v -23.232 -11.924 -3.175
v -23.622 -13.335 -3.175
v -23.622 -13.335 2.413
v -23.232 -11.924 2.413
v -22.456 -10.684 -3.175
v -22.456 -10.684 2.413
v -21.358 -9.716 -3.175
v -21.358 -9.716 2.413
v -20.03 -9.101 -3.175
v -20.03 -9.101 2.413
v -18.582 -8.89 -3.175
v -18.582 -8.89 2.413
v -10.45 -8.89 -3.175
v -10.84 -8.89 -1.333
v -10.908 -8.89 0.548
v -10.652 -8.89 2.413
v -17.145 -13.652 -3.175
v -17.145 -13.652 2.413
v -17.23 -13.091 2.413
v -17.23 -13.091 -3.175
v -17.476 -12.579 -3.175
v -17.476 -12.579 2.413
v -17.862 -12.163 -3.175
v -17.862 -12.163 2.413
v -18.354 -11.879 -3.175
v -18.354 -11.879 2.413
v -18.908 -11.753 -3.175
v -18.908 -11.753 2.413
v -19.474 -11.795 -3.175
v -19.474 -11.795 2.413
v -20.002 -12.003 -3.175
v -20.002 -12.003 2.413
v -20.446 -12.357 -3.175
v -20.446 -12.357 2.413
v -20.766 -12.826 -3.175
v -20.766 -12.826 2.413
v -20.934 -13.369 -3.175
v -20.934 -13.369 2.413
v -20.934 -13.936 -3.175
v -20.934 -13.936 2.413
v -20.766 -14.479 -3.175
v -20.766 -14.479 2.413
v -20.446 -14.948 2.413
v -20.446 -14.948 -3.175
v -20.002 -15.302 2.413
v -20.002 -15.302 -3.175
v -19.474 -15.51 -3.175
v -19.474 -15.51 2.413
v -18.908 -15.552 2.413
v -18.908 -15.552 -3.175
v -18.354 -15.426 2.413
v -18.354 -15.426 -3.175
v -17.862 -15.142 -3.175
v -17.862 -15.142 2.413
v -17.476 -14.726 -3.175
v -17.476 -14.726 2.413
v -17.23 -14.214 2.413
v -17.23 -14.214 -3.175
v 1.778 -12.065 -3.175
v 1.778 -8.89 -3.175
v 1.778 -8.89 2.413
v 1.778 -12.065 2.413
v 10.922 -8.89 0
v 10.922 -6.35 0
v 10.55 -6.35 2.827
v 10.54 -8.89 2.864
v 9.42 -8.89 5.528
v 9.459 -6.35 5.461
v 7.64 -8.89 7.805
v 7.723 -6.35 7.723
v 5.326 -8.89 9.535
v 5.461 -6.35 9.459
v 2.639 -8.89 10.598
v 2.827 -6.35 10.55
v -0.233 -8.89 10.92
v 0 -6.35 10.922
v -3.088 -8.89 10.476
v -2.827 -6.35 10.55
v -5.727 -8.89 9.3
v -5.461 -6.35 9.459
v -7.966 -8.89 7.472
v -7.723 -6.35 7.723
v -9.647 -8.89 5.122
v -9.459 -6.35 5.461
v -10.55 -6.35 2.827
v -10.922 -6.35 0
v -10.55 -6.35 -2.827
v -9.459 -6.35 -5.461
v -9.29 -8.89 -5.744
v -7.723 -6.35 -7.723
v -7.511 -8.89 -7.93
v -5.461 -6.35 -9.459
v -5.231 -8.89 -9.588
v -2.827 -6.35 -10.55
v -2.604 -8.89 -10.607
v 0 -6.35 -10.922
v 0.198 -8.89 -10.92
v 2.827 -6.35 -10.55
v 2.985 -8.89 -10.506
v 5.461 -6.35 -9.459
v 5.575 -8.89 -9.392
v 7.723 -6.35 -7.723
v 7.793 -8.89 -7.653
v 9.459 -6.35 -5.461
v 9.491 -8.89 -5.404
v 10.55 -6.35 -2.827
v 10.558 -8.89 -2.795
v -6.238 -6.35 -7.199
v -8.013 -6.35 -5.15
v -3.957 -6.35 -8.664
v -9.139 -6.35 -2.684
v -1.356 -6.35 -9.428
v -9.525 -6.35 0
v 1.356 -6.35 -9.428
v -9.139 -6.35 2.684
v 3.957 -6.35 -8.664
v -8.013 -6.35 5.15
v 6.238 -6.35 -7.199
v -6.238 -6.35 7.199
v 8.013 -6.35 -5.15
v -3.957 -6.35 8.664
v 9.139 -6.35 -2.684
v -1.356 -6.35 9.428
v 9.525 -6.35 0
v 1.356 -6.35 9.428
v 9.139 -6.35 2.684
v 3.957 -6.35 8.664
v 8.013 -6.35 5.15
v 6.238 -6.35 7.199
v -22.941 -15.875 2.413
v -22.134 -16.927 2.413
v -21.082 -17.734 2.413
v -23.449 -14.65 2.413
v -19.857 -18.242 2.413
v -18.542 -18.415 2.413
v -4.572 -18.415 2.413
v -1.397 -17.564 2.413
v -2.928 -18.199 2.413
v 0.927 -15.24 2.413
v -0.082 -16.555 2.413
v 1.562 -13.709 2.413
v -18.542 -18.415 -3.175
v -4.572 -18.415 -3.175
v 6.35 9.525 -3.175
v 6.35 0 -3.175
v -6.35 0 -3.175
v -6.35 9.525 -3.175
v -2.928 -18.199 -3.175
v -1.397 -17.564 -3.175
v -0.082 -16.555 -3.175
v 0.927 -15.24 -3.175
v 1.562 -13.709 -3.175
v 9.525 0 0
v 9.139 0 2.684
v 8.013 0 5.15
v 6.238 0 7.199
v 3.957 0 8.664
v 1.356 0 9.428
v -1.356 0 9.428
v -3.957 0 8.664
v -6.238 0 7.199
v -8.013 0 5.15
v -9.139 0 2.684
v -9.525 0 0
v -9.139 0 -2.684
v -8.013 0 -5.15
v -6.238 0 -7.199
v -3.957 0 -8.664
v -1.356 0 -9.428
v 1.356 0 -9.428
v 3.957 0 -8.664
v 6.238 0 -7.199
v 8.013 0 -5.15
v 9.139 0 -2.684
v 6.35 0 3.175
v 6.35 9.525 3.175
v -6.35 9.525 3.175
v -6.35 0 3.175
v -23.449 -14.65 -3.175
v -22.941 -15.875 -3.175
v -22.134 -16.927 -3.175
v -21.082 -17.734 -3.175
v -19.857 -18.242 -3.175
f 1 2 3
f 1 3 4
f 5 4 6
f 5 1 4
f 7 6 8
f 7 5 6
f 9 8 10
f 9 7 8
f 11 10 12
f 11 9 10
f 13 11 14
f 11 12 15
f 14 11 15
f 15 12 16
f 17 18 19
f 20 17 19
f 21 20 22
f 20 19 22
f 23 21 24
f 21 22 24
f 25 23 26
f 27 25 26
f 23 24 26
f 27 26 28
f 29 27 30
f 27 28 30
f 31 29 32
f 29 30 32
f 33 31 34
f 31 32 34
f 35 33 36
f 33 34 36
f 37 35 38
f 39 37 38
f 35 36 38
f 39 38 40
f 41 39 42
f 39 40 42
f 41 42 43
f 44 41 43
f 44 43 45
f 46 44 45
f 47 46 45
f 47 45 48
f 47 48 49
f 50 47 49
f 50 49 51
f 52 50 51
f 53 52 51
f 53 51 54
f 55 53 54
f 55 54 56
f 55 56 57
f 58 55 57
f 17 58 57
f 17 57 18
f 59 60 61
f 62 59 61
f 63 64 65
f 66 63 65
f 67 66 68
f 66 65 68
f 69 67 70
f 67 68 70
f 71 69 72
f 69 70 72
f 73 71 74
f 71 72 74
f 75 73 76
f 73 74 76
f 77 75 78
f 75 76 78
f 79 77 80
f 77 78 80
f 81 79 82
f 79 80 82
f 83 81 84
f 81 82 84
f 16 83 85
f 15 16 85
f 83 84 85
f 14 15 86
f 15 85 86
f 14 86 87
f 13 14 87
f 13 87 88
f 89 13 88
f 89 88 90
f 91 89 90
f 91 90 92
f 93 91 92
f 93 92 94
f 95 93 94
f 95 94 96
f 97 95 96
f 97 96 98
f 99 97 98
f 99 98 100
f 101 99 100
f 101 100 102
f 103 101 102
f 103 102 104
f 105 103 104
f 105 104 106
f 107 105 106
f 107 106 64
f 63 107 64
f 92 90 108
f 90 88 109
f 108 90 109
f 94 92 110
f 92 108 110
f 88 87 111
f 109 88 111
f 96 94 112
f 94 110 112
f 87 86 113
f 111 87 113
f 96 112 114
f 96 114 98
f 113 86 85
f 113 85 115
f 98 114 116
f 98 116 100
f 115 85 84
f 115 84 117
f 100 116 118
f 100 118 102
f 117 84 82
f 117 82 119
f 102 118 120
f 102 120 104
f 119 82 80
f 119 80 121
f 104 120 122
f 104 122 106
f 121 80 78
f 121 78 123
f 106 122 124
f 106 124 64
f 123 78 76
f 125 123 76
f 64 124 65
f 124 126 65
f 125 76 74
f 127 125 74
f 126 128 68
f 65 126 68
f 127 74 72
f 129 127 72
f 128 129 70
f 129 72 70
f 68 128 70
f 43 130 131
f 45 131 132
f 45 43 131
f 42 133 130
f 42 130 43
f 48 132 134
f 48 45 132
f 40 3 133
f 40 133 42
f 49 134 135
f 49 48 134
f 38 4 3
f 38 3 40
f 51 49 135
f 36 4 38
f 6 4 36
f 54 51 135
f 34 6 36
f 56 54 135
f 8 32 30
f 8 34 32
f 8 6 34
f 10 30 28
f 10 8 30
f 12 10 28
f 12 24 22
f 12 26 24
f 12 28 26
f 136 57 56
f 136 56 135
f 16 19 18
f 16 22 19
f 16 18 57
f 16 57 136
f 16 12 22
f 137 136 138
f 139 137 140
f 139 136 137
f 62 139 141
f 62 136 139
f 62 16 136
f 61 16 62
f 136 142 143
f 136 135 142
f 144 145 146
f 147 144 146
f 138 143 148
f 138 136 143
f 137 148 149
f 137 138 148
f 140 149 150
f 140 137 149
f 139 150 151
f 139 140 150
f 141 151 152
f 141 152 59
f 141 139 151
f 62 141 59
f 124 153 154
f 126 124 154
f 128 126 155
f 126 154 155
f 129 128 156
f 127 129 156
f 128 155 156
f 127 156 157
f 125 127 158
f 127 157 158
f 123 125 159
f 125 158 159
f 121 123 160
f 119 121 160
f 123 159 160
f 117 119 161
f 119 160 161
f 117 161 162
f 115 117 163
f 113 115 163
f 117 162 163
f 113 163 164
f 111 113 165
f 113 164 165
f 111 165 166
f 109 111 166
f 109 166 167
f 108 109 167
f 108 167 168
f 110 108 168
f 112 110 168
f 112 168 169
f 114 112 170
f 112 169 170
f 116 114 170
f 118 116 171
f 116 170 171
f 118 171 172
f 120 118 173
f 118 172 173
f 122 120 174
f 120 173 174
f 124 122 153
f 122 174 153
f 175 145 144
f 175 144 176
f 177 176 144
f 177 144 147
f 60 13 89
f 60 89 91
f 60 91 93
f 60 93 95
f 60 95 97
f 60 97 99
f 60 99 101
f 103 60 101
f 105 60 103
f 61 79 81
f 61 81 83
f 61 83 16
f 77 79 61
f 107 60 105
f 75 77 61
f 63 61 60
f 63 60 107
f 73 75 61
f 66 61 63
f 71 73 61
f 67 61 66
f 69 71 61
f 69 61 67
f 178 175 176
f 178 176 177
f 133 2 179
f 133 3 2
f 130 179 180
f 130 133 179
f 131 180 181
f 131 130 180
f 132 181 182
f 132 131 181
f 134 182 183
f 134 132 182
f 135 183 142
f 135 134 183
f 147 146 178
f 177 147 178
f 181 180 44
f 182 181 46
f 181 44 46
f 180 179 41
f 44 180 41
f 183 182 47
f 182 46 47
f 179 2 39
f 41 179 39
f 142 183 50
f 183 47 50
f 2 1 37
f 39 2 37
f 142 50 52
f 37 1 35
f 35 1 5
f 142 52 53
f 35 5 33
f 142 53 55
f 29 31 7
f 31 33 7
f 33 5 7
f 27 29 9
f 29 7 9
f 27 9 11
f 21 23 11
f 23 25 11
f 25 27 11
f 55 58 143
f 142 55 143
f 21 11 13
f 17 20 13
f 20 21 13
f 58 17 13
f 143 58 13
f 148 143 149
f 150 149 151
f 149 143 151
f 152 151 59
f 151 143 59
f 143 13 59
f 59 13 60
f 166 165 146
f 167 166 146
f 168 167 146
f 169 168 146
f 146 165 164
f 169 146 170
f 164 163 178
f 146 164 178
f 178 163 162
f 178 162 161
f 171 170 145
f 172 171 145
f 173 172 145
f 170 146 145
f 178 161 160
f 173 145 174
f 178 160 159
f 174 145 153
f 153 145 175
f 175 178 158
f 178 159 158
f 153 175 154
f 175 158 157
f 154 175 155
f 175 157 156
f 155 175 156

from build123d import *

# Parameters (mm, degrees)
F0_R        = 9.525
F1_DEPTH    = 6.35
F2_W        = 12.7
F2_H        = 6.35
F3_DEPTH    = 9.525
F4_R        = 10.922
F5_DEPTH    = 2.54
F6_W        = 25.4
F6_H        = 5.588
F7_DEPTH    = 9.525
F8_R        = 5.08
F9_T1_DEPTH = 30.7887812379
F10_R       = 6.35
F11_R       = 1.905
F12_DEPTH   = 13.336


# Not quite as in the source:
# - a fillet or chamfer that OpenCascade refuses, or shapes differently, is made with other operations: its cross-section is extruded or revolved along the edge and cut away or added


with BuildPart() as f1:
    # F0 (on Front) → F1 (new body)
    with BuildSketch(Plane.XZ):
        Circle(F0_R)
    extrude(amount=F1_DEPTH)

    # F2 (on face) → F3 (join)
    with BuildSketch(Plane(origin=(0, 0, 0), x_dir=(-1, 0, 0), z_dir=(0, 1, 0))):
        Rectangle(F2_W, F2_H)
    extrude(amount=F3_DEPTH)

    # F4 (on face) → F5 (join)
    with BuildSketch(Plane.XZ.offset(6.35)):
        Circle(F4_R)
    extrude(amount=F5_DEPTH)

    # F6 (on face) → F7 (join)
    with BuildSketch(Plane.XZ.offset(8.89)):
        with Locations((-10.922, -0.381)):
            Rectangle(F6_W, F6_H)
    extrude(amount=F7_DEPTH)

    # F8
    f8_edges = [f1.edges().sort_by_distance(p)[0] for p in [
        (-23.622, -18.415, -0.381),
    ]]
    fillet(f8_edges, radius=F8_R)

    # F9: fillet of radius 5.08 on 1 edges, made by hand

    # F9_s2 → F9_t1 (cut)
    with BuildSketch(Plane.XY.offset(-15.7753906189)):
        with BuildLine():
            ThreePointArc((-23.622, -13.335), (-21.9419479175, -10.16), (-18.5818437524, -8.89))
            Line((-18.5818437524, -8.89), (-23.622, -8.89))
            Line((-23.622, -8.89), (-23.622, -13.335))
        make_face()
    extrude(amount=F9_T1_DEPTH, mode=Mode.SUBTRACT)

    # F10
    f10_edges = [f1.edges().sort_by_distance(p)[0] for p in [
        (1.778, -18.415, -0.381),
    ]]
    fillet(f10_edges, radius=F10_R)

    # F11 (on face) → F12 (cut, through all)
    with BuildSketch(Plane.XY.offset(2.413)):
        with Locations((-19.05, -13.6525)):
            Circle(F11_R)
    extrude(amount=-F12_DEPTH, mode=Mode.SUBTRACT)


solid = f1.part
